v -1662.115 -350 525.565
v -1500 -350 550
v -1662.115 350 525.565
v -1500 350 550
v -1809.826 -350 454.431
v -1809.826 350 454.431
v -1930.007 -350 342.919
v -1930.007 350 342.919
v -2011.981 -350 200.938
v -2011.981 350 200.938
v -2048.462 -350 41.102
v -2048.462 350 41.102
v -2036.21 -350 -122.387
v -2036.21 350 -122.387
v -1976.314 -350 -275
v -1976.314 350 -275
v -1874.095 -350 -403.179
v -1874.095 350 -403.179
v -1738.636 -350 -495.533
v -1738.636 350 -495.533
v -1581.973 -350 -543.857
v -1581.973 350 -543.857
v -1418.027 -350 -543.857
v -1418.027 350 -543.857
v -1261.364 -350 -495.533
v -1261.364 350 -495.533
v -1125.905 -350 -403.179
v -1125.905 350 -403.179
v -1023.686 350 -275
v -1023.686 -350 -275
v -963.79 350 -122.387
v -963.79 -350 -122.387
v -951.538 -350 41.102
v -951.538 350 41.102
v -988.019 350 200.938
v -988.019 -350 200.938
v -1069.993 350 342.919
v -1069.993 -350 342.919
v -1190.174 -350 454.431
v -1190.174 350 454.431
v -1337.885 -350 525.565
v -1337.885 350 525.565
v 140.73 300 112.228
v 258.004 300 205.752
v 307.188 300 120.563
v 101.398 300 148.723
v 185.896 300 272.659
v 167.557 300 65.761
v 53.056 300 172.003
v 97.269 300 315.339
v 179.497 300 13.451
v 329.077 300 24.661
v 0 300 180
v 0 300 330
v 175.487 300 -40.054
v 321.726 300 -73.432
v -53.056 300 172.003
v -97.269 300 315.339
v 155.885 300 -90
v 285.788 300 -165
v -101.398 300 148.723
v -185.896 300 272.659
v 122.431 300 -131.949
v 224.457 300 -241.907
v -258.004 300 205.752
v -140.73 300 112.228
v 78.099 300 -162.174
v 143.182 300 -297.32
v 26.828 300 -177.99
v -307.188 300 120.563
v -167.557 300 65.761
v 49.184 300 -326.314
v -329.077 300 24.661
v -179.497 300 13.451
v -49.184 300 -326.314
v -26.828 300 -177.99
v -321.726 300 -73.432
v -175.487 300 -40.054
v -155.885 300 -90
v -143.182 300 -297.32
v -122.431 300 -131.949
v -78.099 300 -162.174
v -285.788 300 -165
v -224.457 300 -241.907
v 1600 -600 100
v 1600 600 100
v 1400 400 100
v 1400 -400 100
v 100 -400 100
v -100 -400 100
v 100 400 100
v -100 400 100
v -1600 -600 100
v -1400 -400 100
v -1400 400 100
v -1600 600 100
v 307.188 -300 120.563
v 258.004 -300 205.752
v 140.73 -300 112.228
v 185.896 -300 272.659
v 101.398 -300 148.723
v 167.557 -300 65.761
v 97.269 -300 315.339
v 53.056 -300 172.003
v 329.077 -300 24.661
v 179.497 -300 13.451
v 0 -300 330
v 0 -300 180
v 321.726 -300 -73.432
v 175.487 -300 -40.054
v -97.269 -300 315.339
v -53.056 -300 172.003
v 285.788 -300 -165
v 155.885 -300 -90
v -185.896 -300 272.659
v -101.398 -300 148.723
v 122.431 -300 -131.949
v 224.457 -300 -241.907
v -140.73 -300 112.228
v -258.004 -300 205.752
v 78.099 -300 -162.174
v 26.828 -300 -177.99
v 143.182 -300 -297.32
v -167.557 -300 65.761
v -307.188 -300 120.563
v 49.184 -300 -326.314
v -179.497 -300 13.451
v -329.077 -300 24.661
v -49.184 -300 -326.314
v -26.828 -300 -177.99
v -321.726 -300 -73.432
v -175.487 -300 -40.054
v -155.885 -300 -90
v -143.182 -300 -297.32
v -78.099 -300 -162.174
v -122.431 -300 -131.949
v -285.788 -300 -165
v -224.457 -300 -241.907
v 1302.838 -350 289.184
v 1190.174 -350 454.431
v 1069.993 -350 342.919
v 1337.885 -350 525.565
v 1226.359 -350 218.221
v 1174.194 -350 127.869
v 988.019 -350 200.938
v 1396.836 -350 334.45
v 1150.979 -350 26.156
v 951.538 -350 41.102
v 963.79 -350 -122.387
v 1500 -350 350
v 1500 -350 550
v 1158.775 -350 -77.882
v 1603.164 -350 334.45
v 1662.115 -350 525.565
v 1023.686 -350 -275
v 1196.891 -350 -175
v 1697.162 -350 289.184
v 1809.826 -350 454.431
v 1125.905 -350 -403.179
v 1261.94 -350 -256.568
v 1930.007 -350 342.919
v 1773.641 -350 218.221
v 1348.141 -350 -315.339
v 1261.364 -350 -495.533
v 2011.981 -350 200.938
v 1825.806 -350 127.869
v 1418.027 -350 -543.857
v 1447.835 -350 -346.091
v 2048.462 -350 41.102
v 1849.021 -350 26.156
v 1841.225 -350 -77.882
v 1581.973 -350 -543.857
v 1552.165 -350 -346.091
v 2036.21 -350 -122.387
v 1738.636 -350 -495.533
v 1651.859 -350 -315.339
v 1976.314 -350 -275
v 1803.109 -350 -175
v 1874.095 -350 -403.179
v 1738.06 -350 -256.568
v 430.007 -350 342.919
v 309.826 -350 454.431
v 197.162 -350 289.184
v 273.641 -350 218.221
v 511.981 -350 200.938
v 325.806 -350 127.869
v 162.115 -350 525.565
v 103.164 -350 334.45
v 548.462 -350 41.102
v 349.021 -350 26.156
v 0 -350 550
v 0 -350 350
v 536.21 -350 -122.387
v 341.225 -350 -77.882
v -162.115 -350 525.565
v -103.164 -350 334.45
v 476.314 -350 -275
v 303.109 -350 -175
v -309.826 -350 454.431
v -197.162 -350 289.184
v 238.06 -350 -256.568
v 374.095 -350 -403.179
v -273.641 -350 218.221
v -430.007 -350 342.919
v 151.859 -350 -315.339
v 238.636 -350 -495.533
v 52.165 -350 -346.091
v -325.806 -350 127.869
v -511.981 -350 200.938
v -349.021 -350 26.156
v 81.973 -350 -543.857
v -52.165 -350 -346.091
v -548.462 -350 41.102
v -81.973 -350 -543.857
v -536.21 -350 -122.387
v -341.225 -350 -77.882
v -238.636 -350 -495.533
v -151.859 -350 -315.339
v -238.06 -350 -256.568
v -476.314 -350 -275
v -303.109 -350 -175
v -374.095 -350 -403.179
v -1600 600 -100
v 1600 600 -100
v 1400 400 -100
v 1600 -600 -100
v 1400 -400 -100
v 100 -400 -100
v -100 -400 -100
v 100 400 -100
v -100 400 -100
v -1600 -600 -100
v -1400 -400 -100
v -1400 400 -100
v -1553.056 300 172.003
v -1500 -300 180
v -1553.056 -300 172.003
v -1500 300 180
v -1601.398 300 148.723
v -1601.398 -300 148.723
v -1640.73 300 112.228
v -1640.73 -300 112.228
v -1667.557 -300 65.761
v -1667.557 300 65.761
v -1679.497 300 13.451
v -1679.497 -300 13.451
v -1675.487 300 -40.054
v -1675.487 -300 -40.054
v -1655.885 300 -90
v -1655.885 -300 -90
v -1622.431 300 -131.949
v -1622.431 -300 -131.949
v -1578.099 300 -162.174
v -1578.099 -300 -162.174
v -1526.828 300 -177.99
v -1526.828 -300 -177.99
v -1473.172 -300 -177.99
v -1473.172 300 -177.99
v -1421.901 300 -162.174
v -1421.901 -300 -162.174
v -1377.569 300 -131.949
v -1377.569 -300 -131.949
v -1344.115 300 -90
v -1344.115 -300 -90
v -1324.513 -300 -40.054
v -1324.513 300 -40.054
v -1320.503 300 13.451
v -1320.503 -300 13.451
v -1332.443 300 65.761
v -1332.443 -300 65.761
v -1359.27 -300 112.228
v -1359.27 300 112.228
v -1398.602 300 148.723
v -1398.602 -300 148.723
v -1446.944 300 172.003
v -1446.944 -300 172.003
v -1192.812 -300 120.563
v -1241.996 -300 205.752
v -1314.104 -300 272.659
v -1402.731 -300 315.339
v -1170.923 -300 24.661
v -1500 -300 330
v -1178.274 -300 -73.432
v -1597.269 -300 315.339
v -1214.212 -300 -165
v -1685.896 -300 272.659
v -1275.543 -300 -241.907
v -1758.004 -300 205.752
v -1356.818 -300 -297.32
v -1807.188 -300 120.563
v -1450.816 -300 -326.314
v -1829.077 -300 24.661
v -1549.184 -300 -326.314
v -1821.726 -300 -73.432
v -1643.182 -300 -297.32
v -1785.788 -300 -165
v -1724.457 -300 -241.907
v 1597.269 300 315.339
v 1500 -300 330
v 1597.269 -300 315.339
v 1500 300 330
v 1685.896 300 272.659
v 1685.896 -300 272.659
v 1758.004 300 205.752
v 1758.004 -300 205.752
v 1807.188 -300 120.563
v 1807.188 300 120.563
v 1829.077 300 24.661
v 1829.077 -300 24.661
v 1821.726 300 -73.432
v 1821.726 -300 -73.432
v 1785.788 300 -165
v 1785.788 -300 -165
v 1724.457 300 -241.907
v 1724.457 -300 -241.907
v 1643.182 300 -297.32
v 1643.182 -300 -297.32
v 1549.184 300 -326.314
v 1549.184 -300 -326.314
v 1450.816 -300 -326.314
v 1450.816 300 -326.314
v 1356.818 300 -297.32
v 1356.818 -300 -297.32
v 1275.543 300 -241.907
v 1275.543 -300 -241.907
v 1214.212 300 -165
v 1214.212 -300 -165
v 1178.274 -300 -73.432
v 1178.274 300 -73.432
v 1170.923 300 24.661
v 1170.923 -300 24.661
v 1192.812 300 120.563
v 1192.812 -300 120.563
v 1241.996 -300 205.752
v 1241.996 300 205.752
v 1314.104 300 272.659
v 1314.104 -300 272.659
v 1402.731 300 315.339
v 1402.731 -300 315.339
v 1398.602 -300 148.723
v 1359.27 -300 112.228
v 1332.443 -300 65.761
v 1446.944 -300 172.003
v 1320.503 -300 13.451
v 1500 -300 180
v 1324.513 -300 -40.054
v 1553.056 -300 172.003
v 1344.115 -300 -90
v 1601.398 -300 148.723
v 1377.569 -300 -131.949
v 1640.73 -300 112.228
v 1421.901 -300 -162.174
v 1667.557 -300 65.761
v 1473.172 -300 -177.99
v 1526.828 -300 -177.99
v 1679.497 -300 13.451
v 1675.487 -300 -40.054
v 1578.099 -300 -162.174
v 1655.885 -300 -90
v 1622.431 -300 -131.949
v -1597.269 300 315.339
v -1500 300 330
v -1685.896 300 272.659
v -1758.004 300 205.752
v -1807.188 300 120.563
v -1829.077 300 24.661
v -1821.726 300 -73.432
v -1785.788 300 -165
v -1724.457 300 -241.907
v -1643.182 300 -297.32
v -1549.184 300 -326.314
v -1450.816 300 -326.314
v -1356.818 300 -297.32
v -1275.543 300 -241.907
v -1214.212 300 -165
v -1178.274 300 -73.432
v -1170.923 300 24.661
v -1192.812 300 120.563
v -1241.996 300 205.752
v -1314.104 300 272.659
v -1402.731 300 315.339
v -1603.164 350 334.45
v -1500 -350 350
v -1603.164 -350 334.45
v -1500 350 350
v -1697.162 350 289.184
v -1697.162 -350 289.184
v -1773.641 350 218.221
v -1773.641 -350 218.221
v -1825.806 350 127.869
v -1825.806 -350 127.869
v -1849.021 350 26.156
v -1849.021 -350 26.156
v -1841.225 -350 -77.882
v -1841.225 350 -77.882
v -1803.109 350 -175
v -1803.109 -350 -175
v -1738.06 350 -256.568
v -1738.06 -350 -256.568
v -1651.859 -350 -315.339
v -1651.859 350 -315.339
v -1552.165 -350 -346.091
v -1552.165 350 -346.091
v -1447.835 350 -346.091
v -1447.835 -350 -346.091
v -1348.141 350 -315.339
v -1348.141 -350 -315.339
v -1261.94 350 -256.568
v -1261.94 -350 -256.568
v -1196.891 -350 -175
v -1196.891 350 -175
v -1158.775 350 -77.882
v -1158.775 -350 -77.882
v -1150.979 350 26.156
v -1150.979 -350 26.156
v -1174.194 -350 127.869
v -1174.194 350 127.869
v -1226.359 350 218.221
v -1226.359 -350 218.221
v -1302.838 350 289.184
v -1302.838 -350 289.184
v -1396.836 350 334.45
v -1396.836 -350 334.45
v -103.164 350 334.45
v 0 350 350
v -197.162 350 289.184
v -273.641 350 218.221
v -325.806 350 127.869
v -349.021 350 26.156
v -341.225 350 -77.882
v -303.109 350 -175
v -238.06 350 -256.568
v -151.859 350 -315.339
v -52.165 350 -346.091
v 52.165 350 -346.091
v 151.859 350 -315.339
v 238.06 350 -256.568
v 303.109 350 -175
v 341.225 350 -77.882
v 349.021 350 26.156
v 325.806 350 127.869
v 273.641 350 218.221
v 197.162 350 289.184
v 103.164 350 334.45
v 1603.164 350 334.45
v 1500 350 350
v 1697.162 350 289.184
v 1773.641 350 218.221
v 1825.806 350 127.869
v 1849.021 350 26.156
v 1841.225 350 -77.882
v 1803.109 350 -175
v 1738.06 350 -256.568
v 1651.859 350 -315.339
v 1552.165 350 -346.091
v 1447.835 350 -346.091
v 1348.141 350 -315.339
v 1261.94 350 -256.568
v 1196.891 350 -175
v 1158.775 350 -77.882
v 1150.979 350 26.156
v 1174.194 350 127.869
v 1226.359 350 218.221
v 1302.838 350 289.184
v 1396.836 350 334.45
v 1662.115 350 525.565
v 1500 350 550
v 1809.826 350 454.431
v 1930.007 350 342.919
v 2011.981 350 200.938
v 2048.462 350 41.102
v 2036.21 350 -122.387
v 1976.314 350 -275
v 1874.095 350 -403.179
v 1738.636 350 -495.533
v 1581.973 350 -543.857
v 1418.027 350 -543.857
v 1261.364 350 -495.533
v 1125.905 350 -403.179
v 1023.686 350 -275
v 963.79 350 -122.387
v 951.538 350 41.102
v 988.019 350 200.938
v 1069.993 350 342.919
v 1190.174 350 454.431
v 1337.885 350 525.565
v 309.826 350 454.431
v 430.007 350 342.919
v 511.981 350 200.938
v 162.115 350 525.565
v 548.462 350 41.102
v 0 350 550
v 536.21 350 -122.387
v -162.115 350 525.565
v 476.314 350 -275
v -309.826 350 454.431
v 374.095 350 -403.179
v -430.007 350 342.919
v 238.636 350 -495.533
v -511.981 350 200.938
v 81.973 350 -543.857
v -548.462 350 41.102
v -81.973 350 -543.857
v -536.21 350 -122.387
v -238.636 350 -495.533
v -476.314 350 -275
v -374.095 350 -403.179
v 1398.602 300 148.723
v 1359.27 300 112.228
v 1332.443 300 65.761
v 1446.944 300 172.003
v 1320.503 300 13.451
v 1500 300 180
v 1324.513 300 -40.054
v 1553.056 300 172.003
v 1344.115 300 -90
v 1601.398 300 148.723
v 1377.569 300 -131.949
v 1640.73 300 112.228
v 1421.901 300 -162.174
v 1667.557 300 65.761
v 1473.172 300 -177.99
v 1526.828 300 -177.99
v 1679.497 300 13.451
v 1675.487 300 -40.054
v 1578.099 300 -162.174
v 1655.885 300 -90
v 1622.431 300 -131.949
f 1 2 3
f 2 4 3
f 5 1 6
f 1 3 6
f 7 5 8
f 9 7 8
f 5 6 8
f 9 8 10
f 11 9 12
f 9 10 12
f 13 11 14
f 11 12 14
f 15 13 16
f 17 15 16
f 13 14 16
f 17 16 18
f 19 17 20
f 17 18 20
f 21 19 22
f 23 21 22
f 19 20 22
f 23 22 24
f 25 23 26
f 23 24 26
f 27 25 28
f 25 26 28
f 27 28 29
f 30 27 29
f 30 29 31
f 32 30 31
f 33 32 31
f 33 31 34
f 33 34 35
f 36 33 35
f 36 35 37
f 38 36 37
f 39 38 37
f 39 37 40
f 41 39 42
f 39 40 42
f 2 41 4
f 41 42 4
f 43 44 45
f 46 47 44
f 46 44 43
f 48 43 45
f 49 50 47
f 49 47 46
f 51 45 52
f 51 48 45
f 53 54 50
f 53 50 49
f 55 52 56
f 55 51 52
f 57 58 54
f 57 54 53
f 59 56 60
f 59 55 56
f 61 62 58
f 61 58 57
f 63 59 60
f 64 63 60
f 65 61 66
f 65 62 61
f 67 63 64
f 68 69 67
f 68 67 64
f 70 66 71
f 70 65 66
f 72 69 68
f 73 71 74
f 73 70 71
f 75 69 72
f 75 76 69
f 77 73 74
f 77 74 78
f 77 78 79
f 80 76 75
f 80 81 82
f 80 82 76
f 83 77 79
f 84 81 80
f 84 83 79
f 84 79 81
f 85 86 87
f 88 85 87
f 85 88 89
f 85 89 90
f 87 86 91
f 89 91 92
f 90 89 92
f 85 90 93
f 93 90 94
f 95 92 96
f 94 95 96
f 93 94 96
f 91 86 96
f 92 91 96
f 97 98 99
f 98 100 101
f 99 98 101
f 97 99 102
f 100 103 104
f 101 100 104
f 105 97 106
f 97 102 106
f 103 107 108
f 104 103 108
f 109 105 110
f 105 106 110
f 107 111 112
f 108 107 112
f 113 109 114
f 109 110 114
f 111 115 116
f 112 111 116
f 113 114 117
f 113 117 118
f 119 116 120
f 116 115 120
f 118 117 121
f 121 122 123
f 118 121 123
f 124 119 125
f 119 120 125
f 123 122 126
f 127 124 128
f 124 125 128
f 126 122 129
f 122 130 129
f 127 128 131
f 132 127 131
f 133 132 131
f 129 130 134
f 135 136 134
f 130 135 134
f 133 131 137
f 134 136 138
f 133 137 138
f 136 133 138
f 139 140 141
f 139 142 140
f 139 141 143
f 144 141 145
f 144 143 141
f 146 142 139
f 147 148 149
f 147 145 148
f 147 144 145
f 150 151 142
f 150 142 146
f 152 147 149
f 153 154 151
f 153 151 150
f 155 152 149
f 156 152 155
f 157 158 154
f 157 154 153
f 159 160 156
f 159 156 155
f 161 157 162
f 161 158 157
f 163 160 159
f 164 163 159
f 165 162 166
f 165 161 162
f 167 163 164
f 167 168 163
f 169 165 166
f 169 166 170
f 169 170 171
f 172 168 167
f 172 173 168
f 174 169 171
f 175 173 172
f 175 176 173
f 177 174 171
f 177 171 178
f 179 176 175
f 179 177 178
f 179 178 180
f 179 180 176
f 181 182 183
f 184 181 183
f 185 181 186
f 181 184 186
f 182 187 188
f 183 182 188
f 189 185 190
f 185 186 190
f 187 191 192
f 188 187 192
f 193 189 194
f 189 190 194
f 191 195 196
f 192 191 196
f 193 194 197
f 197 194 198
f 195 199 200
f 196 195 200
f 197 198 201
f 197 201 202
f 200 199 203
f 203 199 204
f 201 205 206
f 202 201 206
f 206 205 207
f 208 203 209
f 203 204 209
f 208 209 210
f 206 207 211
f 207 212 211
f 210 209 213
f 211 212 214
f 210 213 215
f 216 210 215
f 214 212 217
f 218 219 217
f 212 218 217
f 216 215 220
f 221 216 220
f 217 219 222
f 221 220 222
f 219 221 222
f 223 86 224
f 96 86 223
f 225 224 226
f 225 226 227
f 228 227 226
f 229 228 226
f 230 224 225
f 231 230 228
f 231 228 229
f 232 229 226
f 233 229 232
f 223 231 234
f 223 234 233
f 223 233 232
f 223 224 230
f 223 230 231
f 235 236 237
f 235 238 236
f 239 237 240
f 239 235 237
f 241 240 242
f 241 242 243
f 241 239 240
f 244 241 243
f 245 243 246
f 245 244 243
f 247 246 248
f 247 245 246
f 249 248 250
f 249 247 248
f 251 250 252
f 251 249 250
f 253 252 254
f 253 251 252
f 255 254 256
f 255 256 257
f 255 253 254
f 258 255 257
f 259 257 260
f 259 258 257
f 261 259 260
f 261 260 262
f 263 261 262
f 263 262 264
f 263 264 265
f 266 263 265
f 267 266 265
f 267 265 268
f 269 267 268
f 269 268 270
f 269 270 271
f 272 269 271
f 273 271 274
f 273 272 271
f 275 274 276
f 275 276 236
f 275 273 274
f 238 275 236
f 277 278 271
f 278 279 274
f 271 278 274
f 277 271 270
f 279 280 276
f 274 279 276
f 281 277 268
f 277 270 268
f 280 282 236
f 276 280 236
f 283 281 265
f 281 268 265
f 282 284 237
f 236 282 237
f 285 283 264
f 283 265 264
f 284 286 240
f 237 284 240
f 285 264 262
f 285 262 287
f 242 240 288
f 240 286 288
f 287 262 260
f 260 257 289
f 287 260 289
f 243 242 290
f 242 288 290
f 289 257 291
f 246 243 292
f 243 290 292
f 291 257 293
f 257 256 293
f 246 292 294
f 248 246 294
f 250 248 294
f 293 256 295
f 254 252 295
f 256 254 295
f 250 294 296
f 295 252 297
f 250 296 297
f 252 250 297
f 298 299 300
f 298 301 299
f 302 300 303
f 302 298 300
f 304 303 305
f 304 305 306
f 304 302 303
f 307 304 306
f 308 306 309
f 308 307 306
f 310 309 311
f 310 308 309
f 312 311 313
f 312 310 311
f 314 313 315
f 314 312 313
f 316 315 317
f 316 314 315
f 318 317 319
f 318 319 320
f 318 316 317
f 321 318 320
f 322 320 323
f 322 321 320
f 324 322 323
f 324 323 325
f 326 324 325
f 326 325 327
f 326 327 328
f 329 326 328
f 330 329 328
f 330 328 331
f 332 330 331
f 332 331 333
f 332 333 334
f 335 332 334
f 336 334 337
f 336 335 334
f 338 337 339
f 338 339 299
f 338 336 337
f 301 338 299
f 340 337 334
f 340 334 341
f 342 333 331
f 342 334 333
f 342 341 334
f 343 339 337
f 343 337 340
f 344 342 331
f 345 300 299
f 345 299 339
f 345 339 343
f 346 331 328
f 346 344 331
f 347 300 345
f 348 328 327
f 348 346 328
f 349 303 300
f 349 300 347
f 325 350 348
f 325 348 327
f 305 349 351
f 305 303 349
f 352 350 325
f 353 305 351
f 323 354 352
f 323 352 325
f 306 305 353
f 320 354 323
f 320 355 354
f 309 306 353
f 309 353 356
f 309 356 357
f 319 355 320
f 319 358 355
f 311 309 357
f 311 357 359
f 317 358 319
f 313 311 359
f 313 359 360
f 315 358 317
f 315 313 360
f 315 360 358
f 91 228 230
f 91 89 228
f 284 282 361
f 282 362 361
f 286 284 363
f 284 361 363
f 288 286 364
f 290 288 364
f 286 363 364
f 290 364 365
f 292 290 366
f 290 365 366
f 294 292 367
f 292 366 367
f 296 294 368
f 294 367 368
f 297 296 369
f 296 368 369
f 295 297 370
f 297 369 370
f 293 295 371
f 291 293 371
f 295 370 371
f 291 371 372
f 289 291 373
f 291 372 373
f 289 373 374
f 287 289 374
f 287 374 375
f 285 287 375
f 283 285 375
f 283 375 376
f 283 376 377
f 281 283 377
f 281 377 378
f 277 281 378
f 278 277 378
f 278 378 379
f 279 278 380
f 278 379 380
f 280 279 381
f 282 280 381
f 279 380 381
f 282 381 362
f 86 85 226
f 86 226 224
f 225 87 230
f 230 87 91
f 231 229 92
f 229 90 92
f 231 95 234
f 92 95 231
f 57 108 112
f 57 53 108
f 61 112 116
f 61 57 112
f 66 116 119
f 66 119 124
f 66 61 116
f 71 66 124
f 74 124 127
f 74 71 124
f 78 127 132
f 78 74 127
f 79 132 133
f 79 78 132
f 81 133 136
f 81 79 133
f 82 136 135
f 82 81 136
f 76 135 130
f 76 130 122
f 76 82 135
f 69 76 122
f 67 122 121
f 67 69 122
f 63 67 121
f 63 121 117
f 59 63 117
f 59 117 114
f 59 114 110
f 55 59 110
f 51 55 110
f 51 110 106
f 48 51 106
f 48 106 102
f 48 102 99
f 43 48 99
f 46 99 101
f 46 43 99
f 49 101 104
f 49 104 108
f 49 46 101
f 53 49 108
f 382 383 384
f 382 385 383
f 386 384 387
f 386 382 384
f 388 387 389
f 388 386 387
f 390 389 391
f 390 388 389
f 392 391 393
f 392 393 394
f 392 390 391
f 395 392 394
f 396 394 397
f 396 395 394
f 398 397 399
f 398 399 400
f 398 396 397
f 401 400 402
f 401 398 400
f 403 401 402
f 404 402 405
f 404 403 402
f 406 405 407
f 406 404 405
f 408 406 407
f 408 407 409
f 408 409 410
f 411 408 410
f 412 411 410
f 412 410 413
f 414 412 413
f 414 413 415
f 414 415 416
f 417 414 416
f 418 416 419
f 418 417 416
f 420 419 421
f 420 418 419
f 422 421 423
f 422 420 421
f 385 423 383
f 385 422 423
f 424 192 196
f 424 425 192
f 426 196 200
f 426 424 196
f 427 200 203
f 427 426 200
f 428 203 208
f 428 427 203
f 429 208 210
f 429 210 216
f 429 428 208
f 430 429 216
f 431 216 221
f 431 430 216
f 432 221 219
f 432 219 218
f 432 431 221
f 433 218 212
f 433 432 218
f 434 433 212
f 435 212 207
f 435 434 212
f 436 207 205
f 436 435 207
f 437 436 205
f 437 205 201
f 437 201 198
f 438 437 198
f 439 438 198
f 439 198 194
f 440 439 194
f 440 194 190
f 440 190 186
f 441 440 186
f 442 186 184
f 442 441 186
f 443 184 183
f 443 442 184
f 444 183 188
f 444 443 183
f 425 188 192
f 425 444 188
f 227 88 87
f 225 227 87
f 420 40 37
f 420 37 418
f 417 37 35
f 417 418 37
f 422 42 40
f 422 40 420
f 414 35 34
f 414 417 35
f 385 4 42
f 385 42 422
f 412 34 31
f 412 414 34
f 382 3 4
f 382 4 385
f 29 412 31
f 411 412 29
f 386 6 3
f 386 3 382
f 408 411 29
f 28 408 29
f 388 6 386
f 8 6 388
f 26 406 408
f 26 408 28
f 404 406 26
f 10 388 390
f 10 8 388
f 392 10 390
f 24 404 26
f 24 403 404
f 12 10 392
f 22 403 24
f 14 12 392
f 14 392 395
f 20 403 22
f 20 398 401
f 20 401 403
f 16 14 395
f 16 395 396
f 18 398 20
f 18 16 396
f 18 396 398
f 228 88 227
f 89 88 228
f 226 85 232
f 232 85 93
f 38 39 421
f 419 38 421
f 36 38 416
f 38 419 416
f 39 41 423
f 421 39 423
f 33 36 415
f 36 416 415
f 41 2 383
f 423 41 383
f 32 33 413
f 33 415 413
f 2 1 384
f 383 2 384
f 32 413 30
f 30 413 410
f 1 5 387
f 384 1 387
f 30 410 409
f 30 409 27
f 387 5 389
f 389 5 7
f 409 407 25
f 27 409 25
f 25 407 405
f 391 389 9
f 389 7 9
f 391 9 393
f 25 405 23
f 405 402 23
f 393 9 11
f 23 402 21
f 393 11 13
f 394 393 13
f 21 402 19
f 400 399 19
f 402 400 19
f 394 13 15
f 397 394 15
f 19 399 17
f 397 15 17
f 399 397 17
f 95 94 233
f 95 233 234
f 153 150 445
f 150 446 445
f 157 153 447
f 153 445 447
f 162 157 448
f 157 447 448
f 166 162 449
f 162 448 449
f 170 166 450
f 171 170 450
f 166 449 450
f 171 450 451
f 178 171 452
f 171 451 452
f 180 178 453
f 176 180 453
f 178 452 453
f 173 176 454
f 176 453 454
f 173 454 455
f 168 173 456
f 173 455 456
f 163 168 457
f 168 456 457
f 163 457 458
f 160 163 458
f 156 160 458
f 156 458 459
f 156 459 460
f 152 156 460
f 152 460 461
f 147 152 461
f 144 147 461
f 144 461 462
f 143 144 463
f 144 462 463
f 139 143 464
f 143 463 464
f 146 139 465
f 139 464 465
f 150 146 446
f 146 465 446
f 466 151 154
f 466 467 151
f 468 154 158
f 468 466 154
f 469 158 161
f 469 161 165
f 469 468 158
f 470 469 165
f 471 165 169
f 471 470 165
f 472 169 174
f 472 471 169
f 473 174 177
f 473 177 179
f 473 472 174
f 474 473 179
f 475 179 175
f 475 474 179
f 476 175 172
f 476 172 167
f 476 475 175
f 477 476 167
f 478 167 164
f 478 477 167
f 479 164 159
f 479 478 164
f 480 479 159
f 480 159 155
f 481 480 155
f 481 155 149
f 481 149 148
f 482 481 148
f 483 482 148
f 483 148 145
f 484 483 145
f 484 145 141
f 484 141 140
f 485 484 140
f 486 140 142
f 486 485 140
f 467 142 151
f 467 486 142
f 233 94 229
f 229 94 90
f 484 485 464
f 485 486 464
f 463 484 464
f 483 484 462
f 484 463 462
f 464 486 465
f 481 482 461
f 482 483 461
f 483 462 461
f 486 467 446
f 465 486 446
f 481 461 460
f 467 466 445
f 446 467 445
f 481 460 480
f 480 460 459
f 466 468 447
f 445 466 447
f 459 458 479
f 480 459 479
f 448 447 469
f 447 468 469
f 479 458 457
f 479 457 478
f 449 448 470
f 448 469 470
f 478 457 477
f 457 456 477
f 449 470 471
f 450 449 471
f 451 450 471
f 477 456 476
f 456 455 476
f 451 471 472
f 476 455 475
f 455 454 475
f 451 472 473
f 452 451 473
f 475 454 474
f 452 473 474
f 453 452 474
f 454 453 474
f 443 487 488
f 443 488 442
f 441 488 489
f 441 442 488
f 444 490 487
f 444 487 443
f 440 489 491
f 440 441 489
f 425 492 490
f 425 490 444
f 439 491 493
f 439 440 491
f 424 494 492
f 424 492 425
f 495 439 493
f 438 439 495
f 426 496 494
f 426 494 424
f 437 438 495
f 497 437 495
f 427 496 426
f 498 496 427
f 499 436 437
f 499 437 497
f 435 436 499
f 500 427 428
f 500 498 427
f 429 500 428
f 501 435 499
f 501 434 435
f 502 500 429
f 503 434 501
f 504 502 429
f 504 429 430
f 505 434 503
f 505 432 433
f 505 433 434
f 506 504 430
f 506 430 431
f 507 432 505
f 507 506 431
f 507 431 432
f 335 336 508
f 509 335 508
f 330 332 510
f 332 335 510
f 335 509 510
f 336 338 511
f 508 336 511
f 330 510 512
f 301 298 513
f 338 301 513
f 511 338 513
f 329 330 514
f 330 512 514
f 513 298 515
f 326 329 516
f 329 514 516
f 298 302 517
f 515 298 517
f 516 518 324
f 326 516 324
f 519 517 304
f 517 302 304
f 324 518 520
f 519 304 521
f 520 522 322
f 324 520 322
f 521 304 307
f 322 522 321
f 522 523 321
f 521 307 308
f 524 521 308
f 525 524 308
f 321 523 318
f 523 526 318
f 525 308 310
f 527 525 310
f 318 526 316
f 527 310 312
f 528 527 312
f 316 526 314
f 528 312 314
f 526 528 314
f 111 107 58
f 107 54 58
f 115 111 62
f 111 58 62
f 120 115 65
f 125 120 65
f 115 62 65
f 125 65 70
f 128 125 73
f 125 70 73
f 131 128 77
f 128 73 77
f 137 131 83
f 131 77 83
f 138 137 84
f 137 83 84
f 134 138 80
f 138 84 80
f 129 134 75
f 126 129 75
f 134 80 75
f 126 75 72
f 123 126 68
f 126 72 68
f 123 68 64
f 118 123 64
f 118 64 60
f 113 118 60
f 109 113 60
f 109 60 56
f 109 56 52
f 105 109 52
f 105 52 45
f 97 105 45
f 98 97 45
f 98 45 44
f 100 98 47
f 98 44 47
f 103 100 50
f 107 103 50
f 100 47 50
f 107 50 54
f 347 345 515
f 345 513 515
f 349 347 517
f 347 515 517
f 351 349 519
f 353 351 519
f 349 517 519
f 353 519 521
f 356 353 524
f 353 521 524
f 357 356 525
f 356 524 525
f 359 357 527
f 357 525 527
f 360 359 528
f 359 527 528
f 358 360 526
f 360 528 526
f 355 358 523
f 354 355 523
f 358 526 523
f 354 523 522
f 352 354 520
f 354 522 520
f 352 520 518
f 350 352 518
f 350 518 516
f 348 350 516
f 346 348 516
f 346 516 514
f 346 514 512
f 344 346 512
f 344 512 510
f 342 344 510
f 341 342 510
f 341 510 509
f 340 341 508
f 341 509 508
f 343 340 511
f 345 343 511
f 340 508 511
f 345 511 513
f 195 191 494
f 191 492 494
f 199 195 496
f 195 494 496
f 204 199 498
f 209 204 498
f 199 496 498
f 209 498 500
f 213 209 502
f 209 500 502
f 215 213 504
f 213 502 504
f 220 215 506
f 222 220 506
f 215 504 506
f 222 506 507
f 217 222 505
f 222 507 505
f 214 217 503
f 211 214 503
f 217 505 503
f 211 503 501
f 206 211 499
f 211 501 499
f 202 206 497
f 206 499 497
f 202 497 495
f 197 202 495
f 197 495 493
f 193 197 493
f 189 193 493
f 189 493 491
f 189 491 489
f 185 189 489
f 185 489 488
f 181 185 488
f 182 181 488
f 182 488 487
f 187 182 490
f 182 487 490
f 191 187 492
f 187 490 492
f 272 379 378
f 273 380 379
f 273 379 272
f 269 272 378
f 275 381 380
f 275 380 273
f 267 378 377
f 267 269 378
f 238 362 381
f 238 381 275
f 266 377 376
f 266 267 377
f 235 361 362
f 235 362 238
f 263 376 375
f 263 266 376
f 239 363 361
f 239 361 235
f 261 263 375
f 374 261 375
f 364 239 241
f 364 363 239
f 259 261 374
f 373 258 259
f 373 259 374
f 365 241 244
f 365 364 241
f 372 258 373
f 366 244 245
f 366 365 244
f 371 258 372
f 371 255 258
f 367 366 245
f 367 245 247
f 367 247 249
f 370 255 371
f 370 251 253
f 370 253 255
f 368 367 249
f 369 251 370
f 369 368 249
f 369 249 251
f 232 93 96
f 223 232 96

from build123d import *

# Parameters (mm, degrees)
SKETCH2_W           = 1700
SKETCH2_H           = 1200
SKETCH2_W_2         = 1300
SKETCH2_H_2         = 800
BOSS_EXTRUDE1_DEPTH = 100
SKETCH4_W           = 150
SKETCH4_H           = 600
SKETCH5_W           = 200
SKETCH5_H           = 700
LPATTERN2_COUNT     = 2
LPATTERN2_PITCH     = 1500


with BuildPart() as part:
    # Sketch2 → Boss-Extrude1 (new, symmetric)
    with BuildSketch(Plane.XY):
        with Locations((-750, 0)):
            Rectangle(SKETCH2_W, SKETCH2_H)
        with Locations((-750, 0)):
            Rectangle(SKETCH2_W_2, SKETCH2_H_2, mode=Mode.SUBTRACT)
    boss_extrude1 = extrude(amount=BOSS_EXTRUDE1_DEPTH, both=True)

    # Mirror3: Boss-Extrude1 across plane
    add(boss_extrude1.mirror(Plane(origin=(0, 0, 0), x_dir=(0, 0, 1), z_dir=(1, 0, 0))))


with BuildPart() as body_2:
    # Sketch4 → Primary winding (revolve)
    with BuildSketch(Plane.XY, mode=Mode.PRIVATE) as primary_winding_sk:
        with Locations((255, 0)):
            Rectangle(SKETCH4_W, SKETCH4_H)
    revolve(primary_winding_sk.sketch.rotate(Axis((0, 717.90022001, 0), (0, -1, 0)), 90), axis=Axis((0, 717.90022001, 0), (0, -1, 0)))


with BuildPart() as body_3:
    # Sketch5 → Secondary winding (revolve)
    with BuildSketch(Plane.XY, mode=Mode.PRIVATE) as secondary_winding_sk:
        with Locations((450, 0)):
            Rectangle(SKETCH5_W, SKETCH5_H)
    revolve(secondary_winding_sk.sketch.rotate(Axis((0, 717.90022001, 0), (0, -1, 0)), 90), axis=Axis((0, 717.90022001, 0), (0, -1, 0)))


with BuildPart() as lpattern2_1:
    # LPattern2: pattern copy
    add(body_2.part.moved(Location(Vector(-1, 0, 0) * (1 * LPATTERN2_PITCH))))


with BuildPart() as lpattern2_2:
    # LPattern2: pattern copy
    add(body_3.part.moved(Location(Vector(-1, 0, 0) * (1 * LPATTERN2_PITCH))))


with BuildPart() as body_6:
    # Mirror4: mirrored copy
    add(lpattern2_2.part.mirror(Plane(origin=(0, 0, 0), x_dir=(0, 0, 1), z_dir=(1, 0, 0))))


with BuildPart() as body_7:
    # Mirror4 2: mirrored copy
    add(lpattern2_1.part.mirror(Plane(origin=(0, 0, 0), x_dir=(0, 0, 1), z_dir=(1, 0, 0))))


solid = Compound([part.part, body_2.part, body_3.part, lpattern2_1.part, lpattern2_2.part, body_6.part, body_7.part])
